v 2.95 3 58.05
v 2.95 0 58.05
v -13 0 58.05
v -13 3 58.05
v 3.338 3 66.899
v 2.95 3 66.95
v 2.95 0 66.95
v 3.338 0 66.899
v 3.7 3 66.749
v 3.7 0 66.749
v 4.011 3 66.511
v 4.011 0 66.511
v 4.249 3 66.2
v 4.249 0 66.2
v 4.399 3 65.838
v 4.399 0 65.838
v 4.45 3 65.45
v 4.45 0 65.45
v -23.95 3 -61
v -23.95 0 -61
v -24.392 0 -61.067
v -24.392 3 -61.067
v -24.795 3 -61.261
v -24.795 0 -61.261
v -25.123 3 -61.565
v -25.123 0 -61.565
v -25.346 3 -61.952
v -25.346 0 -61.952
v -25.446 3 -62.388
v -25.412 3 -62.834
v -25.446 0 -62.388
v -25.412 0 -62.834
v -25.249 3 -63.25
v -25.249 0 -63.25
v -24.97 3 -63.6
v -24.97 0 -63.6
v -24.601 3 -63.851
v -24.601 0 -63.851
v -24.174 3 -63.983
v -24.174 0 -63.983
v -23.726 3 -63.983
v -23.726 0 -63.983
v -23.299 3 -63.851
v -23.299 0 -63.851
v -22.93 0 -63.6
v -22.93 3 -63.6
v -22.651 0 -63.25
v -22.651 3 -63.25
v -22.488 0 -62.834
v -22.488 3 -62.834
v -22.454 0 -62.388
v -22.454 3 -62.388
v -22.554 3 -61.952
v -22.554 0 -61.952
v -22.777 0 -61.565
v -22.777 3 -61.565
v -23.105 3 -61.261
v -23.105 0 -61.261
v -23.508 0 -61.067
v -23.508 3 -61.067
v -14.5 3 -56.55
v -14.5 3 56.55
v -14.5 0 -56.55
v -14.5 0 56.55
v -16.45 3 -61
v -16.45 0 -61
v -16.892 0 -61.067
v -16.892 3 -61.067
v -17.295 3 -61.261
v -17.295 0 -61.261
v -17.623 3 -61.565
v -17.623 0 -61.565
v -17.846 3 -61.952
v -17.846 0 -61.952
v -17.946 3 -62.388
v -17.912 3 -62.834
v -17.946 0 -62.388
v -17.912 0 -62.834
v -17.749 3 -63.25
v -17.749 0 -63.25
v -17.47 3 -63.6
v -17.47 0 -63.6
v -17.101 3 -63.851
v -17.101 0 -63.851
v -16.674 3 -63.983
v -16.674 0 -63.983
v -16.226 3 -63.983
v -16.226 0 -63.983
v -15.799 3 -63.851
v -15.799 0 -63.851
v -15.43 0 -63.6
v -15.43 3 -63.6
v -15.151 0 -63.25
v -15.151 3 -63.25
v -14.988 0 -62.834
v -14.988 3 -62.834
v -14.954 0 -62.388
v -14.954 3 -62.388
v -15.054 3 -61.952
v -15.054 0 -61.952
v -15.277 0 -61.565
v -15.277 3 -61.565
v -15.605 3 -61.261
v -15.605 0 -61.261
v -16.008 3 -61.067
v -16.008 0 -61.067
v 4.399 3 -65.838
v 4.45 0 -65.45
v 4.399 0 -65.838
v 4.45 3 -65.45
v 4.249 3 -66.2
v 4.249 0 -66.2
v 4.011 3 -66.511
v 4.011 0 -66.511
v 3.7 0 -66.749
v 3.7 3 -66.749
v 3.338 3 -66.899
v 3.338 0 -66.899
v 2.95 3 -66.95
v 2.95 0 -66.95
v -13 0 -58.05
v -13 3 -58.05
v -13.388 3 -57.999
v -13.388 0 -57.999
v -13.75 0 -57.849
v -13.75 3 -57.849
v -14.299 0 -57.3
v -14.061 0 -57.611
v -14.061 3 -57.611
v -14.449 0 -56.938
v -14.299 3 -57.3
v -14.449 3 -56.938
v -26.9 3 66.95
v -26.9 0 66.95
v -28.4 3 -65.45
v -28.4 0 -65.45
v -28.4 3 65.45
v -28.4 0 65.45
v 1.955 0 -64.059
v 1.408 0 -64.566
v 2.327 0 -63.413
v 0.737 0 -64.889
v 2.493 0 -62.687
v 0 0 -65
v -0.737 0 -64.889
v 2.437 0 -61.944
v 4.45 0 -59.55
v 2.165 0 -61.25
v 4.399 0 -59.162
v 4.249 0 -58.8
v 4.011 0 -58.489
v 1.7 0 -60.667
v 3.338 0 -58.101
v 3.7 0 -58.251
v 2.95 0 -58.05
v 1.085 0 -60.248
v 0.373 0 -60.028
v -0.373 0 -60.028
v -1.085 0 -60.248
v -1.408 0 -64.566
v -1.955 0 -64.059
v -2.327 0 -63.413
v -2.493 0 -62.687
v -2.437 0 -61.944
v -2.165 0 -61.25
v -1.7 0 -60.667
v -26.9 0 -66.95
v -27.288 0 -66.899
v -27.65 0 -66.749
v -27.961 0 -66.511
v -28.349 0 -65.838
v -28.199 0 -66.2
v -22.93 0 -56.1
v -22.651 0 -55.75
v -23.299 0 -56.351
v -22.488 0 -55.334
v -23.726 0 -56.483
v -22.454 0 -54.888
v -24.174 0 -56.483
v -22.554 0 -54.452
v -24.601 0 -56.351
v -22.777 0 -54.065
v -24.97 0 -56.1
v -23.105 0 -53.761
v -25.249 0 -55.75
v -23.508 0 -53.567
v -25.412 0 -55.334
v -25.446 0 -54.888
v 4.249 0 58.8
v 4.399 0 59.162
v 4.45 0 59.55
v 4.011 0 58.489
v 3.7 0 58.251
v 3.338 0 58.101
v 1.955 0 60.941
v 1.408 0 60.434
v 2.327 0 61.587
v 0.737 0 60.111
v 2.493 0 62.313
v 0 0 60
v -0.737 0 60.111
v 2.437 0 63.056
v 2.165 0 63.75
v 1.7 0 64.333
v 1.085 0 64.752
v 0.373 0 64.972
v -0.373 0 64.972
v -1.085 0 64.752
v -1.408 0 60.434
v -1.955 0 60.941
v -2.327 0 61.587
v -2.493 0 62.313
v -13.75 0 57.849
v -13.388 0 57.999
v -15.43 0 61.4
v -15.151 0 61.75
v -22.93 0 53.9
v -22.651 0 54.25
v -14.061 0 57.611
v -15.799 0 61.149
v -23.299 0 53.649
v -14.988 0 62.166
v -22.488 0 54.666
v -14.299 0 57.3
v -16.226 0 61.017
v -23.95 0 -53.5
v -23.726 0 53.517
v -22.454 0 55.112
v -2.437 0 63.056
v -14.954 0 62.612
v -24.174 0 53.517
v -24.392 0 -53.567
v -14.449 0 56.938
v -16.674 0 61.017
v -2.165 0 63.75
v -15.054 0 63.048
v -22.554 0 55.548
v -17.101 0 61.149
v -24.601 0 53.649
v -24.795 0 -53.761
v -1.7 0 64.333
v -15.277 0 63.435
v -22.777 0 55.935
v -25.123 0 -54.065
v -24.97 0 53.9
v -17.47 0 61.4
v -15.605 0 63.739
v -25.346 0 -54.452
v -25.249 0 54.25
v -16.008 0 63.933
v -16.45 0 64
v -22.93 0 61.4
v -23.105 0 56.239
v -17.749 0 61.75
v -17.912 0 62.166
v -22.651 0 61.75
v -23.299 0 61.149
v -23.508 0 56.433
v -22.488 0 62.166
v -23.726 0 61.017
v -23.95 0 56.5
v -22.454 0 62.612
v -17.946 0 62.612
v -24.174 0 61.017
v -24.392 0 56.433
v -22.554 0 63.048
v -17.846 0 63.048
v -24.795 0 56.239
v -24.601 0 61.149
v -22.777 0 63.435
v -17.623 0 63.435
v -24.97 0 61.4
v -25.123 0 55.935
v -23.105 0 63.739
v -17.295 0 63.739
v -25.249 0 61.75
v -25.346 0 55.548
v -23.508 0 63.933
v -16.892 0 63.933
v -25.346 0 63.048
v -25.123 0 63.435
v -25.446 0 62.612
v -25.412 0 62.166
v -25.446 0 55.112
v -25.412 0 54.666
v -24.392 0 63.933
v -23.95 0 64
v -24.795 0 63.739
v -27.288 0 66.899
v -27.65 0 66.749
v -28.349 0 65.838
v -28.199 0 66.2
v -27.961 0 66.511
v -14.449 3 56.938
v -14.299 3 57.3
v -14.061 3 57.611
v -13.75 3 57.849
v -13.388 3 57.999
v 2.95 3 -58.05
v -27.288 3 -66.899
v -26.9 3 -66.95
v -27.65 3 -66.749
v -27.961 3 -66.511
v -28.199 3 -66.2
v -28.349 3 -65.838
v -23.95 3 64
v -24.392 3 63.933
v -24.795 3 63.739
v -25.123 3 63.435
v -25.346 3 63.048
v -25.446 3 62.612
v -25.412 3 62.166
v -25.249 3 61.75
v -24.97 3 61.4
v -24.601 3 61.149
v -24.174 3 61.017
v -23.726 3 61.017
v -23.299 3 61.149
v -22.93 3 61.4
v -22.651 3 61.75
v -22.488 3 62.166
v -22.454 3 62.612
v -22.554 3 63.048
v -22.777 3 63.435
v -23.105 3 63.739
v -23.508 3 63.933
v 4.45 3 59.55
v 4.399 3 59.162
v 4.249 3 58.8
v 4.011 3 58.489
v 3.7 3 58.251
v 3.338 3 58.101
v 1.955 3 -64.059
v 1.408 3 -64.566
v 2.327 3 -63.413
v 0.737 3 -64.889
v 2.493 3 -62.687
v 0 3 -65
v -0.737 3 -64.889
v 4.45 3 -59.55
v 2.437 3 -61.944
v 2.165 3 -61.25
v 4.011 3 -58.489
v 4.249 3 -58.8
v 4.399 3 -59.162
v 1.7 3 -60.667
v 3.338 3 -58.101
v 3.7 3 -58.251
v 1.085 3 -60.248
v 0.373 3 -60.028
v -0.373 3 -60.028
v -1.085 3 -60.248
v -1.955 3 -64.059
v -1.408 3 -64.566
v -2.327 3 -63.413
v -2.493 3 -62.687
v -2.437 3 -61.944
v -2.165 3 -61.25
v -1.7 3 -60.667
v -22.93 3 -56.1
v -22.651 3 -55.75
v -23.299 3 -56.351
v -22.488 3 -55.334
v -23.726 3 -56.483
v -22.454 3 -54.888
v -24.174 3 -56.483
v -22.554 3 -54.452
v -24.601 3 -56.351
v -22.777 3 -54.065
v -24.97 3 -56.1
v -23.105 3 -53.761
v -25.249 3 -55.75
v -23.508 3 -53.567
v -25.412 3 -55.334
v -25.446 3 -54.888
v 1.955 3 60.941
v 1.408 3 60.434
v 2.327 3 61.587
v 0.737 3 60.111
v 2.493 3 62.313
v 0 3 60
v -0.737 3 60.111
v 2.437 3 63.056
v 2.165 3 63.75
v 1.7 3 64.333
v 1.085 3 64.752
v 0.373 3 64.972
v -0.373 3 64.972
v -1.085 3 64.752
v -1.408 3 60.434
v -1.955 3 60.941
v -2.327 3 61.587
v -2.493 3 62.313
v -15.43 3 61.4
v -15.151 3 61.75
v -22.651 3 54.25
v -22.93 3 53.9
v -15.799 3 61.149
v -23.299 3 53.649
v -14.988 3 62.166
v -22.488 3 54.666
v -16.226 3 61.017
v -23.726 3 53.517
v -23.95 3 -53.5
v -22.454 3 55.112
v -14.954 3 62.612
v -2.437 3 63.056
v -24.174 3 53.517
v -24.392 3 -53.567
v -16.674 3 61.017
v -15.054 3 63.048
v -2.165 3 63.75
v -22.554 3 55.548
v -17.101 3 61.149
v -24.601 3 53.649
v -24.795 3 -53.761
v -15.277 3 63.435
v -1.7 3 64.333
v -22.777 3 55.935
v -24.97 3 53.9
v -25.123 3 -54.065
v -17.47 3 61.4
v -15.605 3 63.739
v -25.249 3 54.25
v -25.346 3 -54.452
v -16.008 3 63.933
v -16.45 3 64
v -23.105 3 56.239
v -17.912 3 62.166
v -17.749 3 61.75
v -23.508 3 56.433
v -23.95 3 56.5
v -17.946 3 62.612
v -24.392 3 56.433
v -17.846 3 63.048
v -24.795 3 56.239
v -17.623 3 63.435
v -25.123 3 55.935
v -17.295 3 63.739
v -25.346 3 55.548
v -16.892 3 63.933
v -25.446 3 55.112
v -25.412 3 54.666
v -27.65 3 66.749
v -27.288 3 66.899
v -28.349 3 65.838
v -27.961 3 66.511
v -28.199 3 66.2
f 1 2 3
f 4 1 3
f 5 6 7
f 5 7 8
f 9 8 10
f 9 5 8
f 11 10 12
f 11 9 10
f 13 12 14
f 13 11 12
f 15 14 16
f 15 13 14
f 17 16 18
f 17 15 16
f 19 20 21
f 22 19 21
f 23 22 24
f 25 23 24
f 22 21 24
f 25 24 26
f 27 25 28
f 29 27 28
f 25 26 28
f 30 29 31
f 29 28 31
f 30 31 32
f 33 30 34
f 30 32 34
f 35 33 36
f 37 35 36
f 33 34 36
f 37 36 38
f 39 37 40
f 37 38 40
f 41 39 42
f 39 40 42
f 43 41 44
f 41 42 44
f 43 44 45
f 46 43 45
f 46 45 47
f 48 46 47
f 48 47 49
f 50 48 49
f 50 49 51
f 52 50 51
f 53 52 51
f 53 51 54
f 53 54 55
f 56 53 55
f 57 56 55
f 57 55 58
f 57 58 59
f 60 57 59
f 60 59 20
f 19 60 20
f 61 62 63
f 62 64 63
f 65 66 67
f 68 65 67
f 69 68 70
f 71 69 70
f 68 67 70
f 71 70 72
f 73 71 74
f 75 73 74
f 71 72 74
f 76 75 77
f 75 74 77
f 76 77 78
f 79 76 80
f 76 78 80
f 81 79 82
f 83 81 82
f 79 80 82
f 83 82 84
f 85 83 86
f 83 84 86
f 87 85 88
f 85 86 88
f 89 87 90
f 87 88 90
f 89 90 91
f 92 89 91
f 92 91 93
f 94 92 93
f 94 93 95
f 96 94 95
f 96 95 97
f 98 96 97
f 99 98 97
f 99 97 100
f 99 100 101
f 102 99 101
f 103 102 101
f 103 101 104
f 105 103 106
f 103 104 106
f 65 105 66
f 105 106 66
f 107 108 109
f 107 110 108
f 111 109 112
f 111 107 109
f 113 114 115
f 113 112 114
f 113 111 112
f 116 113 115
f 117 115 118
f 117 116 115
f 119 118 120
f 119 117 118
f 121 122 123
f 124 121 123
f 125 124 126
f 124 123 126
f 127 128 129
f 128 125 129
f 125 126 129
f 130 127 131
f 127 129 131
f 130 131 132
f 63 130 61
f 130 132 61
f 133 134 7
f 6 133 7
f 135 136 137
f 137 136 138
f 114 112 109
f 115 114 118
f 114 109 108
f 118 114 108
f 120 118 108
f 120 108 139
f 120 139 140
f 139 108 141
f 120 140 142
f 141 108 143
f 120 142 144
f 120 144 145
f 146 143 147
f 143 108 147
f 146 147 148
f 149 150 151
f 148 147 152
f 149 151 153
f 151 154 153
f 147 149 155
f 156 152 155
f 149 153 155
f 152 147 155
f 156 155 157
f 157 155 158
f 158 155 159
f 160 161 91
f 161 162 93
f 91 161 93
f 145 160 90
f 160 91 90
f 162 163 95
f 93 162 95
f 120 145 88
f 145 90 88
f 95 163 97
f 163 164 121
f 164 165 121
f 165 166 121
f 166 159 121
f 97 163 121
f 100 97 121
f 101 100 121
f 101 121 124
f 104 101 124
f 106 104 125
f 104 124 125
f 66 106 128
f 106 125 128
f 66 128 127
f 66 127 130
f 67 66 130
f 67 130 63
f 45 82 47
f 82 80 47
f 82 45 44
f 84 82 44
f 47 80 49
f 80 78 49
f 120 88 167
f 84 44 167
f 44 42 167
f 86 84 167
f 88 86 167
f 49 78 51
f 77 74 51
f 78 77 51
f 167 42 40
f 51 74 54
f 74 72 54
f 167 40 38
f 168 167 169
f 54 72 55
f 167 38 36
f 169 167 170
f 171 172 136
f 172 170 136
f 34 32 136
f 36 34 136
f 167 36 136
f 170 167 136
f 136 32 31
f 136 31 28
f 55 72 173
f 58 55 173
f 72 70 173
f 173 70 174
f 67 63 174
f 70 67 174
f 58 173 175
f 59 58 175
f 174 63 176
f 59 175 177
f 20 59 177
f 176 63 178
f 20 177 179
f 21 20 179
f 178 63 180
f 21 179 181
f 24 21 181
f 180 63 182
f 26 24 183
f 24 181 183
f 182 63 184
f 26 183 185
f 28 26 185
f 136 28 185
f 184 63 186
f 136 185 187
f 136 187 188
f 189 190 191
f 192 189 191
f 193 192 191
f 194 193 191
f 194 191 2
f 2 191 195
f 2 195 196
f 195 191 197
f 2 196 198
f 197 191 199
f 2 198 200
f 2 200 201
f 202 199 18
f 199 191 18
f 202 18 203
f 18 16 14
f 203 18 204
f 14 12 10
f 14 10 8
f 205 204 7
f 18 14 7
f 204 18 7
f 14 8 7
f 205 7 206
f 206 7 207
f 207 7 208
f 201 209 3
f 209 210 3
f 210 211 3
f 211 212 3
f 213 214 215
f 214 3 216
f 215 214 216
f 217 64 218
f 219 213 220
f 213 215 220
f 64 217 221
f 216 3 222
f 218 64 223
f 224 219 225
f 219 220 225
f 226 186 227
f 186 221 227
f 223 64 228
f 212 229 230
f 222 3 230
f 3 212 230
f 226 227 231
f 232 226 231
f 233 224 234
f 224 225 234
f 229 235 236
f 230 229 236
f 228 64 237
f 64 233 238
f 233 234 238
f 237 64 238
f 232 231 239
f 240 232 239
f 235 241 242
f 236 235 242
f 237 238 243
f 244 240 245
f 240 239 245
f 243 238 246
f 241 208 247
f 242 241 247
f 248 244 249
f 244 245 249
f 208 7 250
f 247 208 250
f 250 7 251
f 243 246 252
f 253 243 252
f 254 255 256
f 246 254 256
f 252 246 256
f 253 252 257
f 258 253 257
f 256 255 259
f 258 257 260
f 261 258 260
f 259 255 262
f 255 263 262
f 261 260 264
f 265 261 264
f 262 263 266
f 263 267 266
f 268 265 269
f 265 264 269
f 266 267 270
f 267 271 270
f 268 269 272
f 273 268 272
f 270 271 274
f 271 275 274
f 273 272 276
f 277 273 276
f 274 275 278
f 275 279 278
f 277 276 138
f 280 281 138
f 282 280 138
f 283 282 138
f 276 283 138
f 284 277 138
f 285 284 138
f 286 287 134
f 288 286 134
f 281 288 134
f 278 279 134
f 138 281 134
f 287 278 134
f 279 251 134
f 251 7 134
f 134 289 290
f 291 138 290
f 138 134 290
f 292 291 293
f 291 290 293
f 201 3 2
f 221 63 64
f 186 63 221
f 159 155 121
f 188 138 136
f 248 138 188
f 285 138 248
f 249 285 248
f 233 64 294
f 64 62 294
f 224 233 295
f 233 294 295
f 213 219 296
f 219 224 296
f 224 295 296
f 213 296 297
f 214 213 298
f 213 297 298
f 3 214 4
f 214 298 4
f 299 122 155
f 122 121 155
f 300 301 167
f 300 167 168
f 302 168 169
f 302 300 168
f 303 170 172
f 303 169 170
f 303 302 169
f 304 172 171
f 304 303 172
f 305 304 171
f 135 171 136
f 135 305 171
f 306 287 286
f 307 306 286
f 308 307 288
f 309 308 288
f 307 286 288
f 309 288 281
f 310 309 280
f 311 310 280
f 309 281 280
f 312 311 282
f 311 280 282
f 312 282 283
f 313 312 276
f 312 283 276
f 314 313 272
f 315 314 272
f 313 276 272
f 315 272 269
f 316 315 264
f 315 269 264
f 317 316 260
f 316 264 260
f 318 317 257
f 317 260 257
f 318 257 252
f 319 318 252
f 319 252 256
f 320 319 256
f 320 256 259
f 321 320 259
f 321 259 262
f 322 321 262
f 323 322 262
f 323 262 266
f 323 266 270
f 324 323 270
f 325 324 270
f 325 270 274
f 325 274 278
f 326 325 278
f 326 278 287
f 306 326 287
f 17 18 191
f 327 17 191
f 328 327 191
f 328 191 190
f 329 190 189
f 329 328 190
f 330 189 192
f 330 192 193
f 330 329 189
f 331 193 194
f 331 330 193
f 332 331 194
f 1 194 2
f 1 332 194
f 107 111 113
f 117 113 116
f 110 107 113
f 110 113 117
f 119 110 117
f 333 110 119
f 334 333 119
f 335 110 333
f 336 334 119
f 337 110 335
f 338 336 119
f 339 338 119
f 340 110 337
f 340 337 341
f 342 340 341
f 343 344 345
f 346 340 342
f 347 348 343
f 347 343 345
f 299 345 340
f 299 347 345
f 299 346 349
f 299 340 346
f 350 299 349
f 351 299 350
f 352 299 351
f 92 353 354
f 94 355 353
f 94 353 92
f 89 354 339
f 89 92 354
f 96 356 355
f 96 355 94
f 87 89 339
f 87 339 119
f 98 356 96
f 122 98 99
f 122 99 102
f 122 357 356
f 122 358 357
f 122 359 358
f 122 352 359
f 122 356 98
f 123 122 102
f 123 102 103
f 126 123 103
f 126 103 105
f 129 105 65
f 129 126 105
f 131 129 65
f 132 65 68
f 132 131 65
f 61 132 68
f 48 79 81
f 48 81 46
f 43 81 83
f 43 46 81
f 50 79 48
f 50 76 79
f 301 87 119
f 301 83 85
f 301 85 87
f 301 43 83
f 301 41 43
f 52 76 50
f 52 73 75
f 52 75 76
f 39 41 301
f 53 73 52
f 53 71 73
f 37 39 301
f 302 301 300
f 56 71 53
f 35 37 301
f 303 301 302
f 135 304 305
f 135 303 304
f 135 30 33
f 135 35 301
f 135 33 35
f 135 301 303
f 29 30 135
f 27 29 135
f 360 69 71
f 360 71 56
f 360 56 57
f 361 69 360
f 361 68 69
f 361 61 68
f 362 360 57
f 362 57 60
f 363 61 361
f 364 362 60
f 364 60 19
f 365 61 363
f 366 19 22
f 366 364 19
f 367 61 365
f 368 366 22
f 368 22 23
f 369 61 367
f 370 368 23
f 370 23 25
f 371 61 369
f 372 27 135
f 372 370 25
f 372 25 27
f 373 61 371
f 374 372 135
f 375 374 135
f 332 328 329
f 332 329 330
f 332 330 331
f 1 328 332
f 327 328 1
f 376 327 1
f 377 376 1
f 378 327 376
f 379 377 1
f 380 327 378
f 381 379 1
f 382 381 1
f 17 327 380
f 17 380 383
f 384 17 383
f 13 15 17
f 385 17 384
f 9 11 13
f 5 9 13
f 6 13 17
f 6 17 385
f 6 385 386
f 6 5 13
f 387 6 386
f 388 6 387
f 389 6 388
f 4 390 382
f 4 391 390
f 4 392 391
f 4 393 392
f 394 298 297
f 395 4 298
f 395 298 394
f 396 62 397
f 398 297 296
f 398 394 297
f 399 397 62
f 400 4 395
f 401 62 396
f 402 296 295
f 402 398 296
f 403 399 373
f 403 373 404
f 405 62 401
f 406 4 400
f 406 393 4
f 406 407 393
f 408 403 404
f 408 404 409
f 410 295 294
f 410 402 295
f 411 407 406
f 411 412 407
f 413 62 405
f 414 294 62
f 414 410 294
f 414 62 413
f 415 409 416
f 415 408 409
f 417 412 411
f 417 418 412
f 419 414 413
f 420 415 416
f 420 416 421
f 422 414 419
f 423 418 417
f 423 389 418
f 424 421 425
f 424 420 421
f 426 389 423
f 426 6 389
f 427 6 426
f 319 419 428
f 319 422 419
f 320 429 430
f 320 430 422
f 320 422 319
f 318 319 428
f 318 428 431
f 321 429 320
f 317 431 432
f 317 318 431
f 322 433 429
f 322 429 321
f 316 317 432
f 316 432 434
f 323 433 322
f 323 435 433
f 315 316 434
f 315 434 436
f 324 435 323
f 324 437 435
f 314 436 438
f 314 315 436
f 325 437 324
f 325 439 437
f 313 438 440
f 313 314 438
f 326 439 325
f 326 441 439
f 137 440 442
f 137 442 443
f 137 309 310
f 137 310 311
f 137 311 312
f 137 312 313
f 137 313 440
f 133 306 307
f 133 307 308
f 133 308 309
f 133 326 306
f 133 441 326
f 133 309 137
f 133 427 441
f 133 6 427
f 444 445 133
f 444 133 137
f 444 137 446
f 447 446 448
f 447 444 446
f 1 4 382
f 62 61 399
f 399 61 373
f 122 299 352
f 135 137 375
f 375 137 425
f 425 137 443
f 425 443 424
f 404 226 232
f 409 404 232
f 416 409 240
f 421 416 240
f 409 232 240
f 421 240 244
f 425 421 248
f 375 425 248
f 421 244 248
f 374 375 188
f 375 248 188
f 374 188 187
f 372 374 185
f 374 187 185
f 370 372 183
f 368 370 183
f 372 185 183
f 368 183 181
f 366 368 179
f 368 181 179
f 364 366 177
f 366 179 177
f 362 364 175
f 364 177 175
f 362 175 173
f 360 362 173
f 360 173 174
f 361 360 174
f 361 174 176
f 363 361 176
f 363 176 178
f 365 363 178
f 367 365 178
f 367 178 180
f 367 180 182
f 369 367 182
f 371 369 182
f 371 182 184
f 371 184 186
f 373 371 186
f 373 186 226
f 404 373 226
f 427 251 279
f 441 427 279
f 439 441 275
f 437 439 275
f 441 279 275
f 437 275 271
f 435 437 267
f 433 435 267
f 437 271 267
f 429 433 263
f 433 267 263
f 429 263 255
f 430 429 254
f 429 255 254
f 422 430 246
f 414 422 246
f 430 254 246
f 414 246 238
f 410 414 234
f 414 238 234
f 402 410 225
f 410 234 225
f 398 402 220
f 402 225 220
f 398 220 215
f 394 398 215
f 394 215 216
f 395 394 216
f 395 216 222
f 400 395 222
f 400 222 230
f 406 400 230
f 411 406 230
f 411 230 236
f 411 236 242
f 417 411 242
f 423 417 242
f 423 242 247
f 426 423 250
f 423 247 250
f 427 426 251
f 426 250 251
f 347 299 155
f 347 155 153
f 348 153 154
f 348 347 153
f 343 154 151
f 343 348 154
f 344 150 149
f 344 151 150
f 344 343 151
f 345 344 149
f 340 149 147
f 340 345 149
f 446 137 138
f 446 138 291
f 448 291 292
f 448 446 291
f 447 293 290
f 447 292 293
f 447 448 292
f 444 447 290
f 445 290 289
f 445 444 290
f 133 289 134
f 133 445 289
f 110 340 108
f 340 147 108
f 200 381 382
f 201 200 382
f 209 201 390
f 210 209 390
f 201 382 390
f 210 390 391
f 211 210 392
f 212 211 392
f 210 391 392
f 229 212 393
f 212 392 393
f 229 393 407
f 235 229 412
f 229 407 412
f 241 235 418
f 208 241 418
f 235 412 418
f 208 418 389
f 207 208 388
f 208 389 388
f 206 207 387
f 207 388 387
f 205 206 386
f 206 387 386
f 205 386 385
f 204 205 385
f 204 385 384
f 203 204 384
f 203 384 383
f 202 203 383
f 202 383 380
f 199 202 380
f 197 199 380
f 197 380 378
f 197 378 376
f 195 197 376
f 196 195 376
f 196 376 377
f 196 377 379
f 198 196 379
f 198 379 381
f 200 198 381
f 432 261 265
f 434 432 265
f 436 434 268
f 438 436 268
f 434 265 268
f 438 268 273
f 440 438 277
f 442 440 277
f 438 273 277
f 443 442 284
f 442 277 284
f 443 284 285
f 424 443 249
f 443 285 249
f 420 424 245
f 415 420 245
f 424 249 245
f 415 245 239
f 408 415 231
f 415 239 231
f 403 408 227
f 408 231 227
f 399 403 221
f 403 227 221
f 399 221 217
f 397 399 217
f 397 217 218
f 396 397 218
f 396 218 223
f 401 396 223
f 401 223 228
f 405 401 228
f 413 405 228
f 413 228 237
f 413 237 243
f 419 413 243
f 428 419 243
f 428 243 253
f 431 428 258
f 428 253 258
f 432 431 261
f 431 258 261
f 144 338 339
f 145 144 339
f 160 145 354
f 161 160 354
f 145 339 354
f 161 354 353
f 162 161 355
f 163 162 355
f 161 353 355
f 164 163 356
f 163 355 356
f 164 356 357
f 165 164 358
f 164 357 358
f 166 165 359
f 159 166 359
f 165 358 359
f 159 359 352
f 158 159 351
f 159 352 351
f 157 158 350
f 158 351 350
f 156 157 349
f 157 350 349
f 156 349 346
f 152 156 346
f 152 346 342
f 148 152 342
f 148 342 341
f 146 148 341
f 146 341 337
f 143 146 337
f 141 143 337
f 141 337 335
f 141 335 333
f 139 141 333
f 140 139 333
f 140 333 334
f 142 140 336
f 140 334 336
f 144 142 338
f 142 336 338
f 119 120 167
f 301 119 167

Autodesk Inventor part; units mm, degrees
ref_plane "YZ Plane" through (0, 0, 0) normal (1, 0, 0) x (0, 1, 0)
ref_plane "XZ Plane" through (0, 0, 0) normal (0, 1, 0) x (-1, 0, 0)
ref_plane "XY Plane" through (0, 0, 0) normal (0, 0, 1) x (1, 0, 0)
sketch "Sketch1" plane through (0, 0, 0) normal (0, 1, 0) x (-1, 0, 0)
  line L0 (0, -62.5) -> (0, 62.5) construction
  line L1 (-4.45, 66.95) -> (-4.45, 58.05)
  line L2 (-4.45, 58.05) -> (14.5, 58.05)
  line L3 (14.5, 58.05) -> (14.5, -58.05)
  line L4 (14.5, -58.05) -> (-4.45, -58.05)
  line L5 (-4.45, -58.05) -> (-4.45, -66.95)
  line L6 (-4.45, -66.95) -> (28.4, -66.95)
  line L7 (28.4, -66.95) -> (28.4, 66.95)
  line L8 (28.4, 66.95) -> (-4.45, 66.95)
  line L9 (0, 62.5) -> (-4.45, 62.5) construction
  line L10 (-4.45, -62.5) -> (0, -62.5) construction
  point P0 (0, 0)
  point P1 (0, 0)
  dimension "d0" = 125
  dimension "d1" = 4.45
  dimension "d2" = 4.45
  dimension "d3" = 13.9
  dimension "d4" = 14.5
  dimension "d5" = 4.45
extrude "Extrusion1" add sketch "Sketch1" along normal blind 3
hole "Hole1" at (0, 0, 62.5) at (0, 0, -62.5) direction (0, 1, 0) diameter 5 end through all
fillet "Fillet1" radius 1.5 8 edges at (-14.5, 1.5, 58.05) (-28.4, 1.5, 66.95) (-14.5, 1.5, -58.05) (-28.4, 1.5, -66.95) (4.45, 1.5, -58.05) (4.45, 1.5, -66.95) (4.45, 1.5, 58.05) (4.45, 1.5, 66.95)
sketch "Sketch2" plane through (0, 3, 0) normal (0, 1, 0) x (1, 0, 0)
  arc A0 (-26.9, 66.95) -> (-28.4, 65.45) centre (-26.9, 65.45) ccw projected
  line L0 (-28.4, 65.45) -> (-28.4, -65.45) projected
  arc A1 (-28.4, -65.45) -> (-26.9, -66.95) centre (-26.9, -65.45) ccw projected
  line L1 (-26.9, -66.95) -> (2.95, -66.95) projected
  line L2 (4.45, -65.45) -> (4.45, -59.55) projected
  line L3 (2.95, -58.05) -> (-13, -58.05) projected
  arc A2 (-14.5, -56.55) -> (-13, -58.05) centre (-13, -56.55) ccw projected
  line L4 (-14.5, -56.55) -> (-14.5, 56.55) projected
  arc A3 (-13, 58.05) -> (-14.5, 56.55) centre (-13, 56.55) ccw projected
  line L5 (-13, 58.05) -> (2.95, 58.05) projected
  line L6 (4.45, 59.55) -> (4.45, 65.45) projected
  line L7 (2.95, 66.95) -> (-26.9, 66.95) projected
  circle A4 centre (0, -62.5) radius 2.5 projected
  circle A5 centre (0, 62.5) radius 2.5 projected
  line L8 (4.45, -65.45) -> (4.45, -59.55) construction
  line L9 (4.45, -62.5) -> (-28.4, -62.5) construction
  line L10 (-28.4, 65.45) -> (-28.4, -65.45) construction
  line L11 (4.45, 59.55) -> (4.45, 65.45) construction
  line L12 (4.45, 62.5) -> (-28.4, 62.5) construction
  line L13 (-14.5, 0) -> (-28.4, 0) construction
  line L14 (2.95, 66.95) -> (-26.9, 66.95) construction
  line L15 (-26.9, -66.95) -> (2.95, -66.95) construction
  line L16 (-23.95, 66.95) -> (-23.95, -66.95) construction
  arc A6 (2.95, -66.95) -> (4.45, -65.45) centre (2.95, -65.45) ccw projected
  arc A7 (4.45, -59.55) -> (2.95, -58.05) centre (2.95, -59.55) ccw projected
  arc A8 (2.95, 58.05) -> (4.45, 59.55) centre (2.95, 59.55) ccw projected
  arc A9 (4.45, 65.45) -> (2.95, 66.95) centre (2.95, 65.45) ccw projected
  point P0 (0, 0)
  point P1 (4.45, -66.95)
  point P2 (4.45, -58.05)
  point P3 (4.45, 58.05)
  point P4 (4.45, 66.95)
  point P5 (-21.45, 0)
  point P6 (-23.95, -62.5)
  point P7 (-16.45, -62.5)
  point P8 (-23.95, -55)
  point P9 (-23.95, 62.5)
  point P10 (-16.45, 62.5)
  point P11 (-23.95, 55)
  dimension "d7" = 0
  dimension "d17" = 7.5
  dimension "d25" = 4.45
  dimension "d26" = 7.5
hole "Hole2" at (-23.95, 3, 62.5) at (-16.45, 3, 62.5) at (-23.95, 3, 55) at (-23.95, 3, -55) at (-23.95, 3, -62.5) at (-16.45, 3, -62.5) direction (0, -1, 0) diameter 3 end through all
equation "\"d0\" = holes_spacing"
equation "\"d1\" = 0.5 * width"
equation "\"d2\" = 0.5 * width"
equation "\"d3\" = width + back_extra_width"
equation "\"d4\" = holes_2_back"
equation "\"d5\" = 0.5 * width"
equation "\"d6\" = thickness"
equation "\"d17\" = piano_wire_holes_spacing"
equation "\"d25\" = 0.5 * width"
equation "\"d26\" = piano_wire_holes_spacing"
equation "\"thickness\" = 3"
equation "\"holes_spacing\" = 125"
equation "\"holes_2_back\" = 14.5"
equation "\"width\" = 8.9"
equation "\"piano_wire_holes_spacing\" = 7.5"
equation "\"back_extra_width\" = 5"
properties part number "nuc_fix_v2"
